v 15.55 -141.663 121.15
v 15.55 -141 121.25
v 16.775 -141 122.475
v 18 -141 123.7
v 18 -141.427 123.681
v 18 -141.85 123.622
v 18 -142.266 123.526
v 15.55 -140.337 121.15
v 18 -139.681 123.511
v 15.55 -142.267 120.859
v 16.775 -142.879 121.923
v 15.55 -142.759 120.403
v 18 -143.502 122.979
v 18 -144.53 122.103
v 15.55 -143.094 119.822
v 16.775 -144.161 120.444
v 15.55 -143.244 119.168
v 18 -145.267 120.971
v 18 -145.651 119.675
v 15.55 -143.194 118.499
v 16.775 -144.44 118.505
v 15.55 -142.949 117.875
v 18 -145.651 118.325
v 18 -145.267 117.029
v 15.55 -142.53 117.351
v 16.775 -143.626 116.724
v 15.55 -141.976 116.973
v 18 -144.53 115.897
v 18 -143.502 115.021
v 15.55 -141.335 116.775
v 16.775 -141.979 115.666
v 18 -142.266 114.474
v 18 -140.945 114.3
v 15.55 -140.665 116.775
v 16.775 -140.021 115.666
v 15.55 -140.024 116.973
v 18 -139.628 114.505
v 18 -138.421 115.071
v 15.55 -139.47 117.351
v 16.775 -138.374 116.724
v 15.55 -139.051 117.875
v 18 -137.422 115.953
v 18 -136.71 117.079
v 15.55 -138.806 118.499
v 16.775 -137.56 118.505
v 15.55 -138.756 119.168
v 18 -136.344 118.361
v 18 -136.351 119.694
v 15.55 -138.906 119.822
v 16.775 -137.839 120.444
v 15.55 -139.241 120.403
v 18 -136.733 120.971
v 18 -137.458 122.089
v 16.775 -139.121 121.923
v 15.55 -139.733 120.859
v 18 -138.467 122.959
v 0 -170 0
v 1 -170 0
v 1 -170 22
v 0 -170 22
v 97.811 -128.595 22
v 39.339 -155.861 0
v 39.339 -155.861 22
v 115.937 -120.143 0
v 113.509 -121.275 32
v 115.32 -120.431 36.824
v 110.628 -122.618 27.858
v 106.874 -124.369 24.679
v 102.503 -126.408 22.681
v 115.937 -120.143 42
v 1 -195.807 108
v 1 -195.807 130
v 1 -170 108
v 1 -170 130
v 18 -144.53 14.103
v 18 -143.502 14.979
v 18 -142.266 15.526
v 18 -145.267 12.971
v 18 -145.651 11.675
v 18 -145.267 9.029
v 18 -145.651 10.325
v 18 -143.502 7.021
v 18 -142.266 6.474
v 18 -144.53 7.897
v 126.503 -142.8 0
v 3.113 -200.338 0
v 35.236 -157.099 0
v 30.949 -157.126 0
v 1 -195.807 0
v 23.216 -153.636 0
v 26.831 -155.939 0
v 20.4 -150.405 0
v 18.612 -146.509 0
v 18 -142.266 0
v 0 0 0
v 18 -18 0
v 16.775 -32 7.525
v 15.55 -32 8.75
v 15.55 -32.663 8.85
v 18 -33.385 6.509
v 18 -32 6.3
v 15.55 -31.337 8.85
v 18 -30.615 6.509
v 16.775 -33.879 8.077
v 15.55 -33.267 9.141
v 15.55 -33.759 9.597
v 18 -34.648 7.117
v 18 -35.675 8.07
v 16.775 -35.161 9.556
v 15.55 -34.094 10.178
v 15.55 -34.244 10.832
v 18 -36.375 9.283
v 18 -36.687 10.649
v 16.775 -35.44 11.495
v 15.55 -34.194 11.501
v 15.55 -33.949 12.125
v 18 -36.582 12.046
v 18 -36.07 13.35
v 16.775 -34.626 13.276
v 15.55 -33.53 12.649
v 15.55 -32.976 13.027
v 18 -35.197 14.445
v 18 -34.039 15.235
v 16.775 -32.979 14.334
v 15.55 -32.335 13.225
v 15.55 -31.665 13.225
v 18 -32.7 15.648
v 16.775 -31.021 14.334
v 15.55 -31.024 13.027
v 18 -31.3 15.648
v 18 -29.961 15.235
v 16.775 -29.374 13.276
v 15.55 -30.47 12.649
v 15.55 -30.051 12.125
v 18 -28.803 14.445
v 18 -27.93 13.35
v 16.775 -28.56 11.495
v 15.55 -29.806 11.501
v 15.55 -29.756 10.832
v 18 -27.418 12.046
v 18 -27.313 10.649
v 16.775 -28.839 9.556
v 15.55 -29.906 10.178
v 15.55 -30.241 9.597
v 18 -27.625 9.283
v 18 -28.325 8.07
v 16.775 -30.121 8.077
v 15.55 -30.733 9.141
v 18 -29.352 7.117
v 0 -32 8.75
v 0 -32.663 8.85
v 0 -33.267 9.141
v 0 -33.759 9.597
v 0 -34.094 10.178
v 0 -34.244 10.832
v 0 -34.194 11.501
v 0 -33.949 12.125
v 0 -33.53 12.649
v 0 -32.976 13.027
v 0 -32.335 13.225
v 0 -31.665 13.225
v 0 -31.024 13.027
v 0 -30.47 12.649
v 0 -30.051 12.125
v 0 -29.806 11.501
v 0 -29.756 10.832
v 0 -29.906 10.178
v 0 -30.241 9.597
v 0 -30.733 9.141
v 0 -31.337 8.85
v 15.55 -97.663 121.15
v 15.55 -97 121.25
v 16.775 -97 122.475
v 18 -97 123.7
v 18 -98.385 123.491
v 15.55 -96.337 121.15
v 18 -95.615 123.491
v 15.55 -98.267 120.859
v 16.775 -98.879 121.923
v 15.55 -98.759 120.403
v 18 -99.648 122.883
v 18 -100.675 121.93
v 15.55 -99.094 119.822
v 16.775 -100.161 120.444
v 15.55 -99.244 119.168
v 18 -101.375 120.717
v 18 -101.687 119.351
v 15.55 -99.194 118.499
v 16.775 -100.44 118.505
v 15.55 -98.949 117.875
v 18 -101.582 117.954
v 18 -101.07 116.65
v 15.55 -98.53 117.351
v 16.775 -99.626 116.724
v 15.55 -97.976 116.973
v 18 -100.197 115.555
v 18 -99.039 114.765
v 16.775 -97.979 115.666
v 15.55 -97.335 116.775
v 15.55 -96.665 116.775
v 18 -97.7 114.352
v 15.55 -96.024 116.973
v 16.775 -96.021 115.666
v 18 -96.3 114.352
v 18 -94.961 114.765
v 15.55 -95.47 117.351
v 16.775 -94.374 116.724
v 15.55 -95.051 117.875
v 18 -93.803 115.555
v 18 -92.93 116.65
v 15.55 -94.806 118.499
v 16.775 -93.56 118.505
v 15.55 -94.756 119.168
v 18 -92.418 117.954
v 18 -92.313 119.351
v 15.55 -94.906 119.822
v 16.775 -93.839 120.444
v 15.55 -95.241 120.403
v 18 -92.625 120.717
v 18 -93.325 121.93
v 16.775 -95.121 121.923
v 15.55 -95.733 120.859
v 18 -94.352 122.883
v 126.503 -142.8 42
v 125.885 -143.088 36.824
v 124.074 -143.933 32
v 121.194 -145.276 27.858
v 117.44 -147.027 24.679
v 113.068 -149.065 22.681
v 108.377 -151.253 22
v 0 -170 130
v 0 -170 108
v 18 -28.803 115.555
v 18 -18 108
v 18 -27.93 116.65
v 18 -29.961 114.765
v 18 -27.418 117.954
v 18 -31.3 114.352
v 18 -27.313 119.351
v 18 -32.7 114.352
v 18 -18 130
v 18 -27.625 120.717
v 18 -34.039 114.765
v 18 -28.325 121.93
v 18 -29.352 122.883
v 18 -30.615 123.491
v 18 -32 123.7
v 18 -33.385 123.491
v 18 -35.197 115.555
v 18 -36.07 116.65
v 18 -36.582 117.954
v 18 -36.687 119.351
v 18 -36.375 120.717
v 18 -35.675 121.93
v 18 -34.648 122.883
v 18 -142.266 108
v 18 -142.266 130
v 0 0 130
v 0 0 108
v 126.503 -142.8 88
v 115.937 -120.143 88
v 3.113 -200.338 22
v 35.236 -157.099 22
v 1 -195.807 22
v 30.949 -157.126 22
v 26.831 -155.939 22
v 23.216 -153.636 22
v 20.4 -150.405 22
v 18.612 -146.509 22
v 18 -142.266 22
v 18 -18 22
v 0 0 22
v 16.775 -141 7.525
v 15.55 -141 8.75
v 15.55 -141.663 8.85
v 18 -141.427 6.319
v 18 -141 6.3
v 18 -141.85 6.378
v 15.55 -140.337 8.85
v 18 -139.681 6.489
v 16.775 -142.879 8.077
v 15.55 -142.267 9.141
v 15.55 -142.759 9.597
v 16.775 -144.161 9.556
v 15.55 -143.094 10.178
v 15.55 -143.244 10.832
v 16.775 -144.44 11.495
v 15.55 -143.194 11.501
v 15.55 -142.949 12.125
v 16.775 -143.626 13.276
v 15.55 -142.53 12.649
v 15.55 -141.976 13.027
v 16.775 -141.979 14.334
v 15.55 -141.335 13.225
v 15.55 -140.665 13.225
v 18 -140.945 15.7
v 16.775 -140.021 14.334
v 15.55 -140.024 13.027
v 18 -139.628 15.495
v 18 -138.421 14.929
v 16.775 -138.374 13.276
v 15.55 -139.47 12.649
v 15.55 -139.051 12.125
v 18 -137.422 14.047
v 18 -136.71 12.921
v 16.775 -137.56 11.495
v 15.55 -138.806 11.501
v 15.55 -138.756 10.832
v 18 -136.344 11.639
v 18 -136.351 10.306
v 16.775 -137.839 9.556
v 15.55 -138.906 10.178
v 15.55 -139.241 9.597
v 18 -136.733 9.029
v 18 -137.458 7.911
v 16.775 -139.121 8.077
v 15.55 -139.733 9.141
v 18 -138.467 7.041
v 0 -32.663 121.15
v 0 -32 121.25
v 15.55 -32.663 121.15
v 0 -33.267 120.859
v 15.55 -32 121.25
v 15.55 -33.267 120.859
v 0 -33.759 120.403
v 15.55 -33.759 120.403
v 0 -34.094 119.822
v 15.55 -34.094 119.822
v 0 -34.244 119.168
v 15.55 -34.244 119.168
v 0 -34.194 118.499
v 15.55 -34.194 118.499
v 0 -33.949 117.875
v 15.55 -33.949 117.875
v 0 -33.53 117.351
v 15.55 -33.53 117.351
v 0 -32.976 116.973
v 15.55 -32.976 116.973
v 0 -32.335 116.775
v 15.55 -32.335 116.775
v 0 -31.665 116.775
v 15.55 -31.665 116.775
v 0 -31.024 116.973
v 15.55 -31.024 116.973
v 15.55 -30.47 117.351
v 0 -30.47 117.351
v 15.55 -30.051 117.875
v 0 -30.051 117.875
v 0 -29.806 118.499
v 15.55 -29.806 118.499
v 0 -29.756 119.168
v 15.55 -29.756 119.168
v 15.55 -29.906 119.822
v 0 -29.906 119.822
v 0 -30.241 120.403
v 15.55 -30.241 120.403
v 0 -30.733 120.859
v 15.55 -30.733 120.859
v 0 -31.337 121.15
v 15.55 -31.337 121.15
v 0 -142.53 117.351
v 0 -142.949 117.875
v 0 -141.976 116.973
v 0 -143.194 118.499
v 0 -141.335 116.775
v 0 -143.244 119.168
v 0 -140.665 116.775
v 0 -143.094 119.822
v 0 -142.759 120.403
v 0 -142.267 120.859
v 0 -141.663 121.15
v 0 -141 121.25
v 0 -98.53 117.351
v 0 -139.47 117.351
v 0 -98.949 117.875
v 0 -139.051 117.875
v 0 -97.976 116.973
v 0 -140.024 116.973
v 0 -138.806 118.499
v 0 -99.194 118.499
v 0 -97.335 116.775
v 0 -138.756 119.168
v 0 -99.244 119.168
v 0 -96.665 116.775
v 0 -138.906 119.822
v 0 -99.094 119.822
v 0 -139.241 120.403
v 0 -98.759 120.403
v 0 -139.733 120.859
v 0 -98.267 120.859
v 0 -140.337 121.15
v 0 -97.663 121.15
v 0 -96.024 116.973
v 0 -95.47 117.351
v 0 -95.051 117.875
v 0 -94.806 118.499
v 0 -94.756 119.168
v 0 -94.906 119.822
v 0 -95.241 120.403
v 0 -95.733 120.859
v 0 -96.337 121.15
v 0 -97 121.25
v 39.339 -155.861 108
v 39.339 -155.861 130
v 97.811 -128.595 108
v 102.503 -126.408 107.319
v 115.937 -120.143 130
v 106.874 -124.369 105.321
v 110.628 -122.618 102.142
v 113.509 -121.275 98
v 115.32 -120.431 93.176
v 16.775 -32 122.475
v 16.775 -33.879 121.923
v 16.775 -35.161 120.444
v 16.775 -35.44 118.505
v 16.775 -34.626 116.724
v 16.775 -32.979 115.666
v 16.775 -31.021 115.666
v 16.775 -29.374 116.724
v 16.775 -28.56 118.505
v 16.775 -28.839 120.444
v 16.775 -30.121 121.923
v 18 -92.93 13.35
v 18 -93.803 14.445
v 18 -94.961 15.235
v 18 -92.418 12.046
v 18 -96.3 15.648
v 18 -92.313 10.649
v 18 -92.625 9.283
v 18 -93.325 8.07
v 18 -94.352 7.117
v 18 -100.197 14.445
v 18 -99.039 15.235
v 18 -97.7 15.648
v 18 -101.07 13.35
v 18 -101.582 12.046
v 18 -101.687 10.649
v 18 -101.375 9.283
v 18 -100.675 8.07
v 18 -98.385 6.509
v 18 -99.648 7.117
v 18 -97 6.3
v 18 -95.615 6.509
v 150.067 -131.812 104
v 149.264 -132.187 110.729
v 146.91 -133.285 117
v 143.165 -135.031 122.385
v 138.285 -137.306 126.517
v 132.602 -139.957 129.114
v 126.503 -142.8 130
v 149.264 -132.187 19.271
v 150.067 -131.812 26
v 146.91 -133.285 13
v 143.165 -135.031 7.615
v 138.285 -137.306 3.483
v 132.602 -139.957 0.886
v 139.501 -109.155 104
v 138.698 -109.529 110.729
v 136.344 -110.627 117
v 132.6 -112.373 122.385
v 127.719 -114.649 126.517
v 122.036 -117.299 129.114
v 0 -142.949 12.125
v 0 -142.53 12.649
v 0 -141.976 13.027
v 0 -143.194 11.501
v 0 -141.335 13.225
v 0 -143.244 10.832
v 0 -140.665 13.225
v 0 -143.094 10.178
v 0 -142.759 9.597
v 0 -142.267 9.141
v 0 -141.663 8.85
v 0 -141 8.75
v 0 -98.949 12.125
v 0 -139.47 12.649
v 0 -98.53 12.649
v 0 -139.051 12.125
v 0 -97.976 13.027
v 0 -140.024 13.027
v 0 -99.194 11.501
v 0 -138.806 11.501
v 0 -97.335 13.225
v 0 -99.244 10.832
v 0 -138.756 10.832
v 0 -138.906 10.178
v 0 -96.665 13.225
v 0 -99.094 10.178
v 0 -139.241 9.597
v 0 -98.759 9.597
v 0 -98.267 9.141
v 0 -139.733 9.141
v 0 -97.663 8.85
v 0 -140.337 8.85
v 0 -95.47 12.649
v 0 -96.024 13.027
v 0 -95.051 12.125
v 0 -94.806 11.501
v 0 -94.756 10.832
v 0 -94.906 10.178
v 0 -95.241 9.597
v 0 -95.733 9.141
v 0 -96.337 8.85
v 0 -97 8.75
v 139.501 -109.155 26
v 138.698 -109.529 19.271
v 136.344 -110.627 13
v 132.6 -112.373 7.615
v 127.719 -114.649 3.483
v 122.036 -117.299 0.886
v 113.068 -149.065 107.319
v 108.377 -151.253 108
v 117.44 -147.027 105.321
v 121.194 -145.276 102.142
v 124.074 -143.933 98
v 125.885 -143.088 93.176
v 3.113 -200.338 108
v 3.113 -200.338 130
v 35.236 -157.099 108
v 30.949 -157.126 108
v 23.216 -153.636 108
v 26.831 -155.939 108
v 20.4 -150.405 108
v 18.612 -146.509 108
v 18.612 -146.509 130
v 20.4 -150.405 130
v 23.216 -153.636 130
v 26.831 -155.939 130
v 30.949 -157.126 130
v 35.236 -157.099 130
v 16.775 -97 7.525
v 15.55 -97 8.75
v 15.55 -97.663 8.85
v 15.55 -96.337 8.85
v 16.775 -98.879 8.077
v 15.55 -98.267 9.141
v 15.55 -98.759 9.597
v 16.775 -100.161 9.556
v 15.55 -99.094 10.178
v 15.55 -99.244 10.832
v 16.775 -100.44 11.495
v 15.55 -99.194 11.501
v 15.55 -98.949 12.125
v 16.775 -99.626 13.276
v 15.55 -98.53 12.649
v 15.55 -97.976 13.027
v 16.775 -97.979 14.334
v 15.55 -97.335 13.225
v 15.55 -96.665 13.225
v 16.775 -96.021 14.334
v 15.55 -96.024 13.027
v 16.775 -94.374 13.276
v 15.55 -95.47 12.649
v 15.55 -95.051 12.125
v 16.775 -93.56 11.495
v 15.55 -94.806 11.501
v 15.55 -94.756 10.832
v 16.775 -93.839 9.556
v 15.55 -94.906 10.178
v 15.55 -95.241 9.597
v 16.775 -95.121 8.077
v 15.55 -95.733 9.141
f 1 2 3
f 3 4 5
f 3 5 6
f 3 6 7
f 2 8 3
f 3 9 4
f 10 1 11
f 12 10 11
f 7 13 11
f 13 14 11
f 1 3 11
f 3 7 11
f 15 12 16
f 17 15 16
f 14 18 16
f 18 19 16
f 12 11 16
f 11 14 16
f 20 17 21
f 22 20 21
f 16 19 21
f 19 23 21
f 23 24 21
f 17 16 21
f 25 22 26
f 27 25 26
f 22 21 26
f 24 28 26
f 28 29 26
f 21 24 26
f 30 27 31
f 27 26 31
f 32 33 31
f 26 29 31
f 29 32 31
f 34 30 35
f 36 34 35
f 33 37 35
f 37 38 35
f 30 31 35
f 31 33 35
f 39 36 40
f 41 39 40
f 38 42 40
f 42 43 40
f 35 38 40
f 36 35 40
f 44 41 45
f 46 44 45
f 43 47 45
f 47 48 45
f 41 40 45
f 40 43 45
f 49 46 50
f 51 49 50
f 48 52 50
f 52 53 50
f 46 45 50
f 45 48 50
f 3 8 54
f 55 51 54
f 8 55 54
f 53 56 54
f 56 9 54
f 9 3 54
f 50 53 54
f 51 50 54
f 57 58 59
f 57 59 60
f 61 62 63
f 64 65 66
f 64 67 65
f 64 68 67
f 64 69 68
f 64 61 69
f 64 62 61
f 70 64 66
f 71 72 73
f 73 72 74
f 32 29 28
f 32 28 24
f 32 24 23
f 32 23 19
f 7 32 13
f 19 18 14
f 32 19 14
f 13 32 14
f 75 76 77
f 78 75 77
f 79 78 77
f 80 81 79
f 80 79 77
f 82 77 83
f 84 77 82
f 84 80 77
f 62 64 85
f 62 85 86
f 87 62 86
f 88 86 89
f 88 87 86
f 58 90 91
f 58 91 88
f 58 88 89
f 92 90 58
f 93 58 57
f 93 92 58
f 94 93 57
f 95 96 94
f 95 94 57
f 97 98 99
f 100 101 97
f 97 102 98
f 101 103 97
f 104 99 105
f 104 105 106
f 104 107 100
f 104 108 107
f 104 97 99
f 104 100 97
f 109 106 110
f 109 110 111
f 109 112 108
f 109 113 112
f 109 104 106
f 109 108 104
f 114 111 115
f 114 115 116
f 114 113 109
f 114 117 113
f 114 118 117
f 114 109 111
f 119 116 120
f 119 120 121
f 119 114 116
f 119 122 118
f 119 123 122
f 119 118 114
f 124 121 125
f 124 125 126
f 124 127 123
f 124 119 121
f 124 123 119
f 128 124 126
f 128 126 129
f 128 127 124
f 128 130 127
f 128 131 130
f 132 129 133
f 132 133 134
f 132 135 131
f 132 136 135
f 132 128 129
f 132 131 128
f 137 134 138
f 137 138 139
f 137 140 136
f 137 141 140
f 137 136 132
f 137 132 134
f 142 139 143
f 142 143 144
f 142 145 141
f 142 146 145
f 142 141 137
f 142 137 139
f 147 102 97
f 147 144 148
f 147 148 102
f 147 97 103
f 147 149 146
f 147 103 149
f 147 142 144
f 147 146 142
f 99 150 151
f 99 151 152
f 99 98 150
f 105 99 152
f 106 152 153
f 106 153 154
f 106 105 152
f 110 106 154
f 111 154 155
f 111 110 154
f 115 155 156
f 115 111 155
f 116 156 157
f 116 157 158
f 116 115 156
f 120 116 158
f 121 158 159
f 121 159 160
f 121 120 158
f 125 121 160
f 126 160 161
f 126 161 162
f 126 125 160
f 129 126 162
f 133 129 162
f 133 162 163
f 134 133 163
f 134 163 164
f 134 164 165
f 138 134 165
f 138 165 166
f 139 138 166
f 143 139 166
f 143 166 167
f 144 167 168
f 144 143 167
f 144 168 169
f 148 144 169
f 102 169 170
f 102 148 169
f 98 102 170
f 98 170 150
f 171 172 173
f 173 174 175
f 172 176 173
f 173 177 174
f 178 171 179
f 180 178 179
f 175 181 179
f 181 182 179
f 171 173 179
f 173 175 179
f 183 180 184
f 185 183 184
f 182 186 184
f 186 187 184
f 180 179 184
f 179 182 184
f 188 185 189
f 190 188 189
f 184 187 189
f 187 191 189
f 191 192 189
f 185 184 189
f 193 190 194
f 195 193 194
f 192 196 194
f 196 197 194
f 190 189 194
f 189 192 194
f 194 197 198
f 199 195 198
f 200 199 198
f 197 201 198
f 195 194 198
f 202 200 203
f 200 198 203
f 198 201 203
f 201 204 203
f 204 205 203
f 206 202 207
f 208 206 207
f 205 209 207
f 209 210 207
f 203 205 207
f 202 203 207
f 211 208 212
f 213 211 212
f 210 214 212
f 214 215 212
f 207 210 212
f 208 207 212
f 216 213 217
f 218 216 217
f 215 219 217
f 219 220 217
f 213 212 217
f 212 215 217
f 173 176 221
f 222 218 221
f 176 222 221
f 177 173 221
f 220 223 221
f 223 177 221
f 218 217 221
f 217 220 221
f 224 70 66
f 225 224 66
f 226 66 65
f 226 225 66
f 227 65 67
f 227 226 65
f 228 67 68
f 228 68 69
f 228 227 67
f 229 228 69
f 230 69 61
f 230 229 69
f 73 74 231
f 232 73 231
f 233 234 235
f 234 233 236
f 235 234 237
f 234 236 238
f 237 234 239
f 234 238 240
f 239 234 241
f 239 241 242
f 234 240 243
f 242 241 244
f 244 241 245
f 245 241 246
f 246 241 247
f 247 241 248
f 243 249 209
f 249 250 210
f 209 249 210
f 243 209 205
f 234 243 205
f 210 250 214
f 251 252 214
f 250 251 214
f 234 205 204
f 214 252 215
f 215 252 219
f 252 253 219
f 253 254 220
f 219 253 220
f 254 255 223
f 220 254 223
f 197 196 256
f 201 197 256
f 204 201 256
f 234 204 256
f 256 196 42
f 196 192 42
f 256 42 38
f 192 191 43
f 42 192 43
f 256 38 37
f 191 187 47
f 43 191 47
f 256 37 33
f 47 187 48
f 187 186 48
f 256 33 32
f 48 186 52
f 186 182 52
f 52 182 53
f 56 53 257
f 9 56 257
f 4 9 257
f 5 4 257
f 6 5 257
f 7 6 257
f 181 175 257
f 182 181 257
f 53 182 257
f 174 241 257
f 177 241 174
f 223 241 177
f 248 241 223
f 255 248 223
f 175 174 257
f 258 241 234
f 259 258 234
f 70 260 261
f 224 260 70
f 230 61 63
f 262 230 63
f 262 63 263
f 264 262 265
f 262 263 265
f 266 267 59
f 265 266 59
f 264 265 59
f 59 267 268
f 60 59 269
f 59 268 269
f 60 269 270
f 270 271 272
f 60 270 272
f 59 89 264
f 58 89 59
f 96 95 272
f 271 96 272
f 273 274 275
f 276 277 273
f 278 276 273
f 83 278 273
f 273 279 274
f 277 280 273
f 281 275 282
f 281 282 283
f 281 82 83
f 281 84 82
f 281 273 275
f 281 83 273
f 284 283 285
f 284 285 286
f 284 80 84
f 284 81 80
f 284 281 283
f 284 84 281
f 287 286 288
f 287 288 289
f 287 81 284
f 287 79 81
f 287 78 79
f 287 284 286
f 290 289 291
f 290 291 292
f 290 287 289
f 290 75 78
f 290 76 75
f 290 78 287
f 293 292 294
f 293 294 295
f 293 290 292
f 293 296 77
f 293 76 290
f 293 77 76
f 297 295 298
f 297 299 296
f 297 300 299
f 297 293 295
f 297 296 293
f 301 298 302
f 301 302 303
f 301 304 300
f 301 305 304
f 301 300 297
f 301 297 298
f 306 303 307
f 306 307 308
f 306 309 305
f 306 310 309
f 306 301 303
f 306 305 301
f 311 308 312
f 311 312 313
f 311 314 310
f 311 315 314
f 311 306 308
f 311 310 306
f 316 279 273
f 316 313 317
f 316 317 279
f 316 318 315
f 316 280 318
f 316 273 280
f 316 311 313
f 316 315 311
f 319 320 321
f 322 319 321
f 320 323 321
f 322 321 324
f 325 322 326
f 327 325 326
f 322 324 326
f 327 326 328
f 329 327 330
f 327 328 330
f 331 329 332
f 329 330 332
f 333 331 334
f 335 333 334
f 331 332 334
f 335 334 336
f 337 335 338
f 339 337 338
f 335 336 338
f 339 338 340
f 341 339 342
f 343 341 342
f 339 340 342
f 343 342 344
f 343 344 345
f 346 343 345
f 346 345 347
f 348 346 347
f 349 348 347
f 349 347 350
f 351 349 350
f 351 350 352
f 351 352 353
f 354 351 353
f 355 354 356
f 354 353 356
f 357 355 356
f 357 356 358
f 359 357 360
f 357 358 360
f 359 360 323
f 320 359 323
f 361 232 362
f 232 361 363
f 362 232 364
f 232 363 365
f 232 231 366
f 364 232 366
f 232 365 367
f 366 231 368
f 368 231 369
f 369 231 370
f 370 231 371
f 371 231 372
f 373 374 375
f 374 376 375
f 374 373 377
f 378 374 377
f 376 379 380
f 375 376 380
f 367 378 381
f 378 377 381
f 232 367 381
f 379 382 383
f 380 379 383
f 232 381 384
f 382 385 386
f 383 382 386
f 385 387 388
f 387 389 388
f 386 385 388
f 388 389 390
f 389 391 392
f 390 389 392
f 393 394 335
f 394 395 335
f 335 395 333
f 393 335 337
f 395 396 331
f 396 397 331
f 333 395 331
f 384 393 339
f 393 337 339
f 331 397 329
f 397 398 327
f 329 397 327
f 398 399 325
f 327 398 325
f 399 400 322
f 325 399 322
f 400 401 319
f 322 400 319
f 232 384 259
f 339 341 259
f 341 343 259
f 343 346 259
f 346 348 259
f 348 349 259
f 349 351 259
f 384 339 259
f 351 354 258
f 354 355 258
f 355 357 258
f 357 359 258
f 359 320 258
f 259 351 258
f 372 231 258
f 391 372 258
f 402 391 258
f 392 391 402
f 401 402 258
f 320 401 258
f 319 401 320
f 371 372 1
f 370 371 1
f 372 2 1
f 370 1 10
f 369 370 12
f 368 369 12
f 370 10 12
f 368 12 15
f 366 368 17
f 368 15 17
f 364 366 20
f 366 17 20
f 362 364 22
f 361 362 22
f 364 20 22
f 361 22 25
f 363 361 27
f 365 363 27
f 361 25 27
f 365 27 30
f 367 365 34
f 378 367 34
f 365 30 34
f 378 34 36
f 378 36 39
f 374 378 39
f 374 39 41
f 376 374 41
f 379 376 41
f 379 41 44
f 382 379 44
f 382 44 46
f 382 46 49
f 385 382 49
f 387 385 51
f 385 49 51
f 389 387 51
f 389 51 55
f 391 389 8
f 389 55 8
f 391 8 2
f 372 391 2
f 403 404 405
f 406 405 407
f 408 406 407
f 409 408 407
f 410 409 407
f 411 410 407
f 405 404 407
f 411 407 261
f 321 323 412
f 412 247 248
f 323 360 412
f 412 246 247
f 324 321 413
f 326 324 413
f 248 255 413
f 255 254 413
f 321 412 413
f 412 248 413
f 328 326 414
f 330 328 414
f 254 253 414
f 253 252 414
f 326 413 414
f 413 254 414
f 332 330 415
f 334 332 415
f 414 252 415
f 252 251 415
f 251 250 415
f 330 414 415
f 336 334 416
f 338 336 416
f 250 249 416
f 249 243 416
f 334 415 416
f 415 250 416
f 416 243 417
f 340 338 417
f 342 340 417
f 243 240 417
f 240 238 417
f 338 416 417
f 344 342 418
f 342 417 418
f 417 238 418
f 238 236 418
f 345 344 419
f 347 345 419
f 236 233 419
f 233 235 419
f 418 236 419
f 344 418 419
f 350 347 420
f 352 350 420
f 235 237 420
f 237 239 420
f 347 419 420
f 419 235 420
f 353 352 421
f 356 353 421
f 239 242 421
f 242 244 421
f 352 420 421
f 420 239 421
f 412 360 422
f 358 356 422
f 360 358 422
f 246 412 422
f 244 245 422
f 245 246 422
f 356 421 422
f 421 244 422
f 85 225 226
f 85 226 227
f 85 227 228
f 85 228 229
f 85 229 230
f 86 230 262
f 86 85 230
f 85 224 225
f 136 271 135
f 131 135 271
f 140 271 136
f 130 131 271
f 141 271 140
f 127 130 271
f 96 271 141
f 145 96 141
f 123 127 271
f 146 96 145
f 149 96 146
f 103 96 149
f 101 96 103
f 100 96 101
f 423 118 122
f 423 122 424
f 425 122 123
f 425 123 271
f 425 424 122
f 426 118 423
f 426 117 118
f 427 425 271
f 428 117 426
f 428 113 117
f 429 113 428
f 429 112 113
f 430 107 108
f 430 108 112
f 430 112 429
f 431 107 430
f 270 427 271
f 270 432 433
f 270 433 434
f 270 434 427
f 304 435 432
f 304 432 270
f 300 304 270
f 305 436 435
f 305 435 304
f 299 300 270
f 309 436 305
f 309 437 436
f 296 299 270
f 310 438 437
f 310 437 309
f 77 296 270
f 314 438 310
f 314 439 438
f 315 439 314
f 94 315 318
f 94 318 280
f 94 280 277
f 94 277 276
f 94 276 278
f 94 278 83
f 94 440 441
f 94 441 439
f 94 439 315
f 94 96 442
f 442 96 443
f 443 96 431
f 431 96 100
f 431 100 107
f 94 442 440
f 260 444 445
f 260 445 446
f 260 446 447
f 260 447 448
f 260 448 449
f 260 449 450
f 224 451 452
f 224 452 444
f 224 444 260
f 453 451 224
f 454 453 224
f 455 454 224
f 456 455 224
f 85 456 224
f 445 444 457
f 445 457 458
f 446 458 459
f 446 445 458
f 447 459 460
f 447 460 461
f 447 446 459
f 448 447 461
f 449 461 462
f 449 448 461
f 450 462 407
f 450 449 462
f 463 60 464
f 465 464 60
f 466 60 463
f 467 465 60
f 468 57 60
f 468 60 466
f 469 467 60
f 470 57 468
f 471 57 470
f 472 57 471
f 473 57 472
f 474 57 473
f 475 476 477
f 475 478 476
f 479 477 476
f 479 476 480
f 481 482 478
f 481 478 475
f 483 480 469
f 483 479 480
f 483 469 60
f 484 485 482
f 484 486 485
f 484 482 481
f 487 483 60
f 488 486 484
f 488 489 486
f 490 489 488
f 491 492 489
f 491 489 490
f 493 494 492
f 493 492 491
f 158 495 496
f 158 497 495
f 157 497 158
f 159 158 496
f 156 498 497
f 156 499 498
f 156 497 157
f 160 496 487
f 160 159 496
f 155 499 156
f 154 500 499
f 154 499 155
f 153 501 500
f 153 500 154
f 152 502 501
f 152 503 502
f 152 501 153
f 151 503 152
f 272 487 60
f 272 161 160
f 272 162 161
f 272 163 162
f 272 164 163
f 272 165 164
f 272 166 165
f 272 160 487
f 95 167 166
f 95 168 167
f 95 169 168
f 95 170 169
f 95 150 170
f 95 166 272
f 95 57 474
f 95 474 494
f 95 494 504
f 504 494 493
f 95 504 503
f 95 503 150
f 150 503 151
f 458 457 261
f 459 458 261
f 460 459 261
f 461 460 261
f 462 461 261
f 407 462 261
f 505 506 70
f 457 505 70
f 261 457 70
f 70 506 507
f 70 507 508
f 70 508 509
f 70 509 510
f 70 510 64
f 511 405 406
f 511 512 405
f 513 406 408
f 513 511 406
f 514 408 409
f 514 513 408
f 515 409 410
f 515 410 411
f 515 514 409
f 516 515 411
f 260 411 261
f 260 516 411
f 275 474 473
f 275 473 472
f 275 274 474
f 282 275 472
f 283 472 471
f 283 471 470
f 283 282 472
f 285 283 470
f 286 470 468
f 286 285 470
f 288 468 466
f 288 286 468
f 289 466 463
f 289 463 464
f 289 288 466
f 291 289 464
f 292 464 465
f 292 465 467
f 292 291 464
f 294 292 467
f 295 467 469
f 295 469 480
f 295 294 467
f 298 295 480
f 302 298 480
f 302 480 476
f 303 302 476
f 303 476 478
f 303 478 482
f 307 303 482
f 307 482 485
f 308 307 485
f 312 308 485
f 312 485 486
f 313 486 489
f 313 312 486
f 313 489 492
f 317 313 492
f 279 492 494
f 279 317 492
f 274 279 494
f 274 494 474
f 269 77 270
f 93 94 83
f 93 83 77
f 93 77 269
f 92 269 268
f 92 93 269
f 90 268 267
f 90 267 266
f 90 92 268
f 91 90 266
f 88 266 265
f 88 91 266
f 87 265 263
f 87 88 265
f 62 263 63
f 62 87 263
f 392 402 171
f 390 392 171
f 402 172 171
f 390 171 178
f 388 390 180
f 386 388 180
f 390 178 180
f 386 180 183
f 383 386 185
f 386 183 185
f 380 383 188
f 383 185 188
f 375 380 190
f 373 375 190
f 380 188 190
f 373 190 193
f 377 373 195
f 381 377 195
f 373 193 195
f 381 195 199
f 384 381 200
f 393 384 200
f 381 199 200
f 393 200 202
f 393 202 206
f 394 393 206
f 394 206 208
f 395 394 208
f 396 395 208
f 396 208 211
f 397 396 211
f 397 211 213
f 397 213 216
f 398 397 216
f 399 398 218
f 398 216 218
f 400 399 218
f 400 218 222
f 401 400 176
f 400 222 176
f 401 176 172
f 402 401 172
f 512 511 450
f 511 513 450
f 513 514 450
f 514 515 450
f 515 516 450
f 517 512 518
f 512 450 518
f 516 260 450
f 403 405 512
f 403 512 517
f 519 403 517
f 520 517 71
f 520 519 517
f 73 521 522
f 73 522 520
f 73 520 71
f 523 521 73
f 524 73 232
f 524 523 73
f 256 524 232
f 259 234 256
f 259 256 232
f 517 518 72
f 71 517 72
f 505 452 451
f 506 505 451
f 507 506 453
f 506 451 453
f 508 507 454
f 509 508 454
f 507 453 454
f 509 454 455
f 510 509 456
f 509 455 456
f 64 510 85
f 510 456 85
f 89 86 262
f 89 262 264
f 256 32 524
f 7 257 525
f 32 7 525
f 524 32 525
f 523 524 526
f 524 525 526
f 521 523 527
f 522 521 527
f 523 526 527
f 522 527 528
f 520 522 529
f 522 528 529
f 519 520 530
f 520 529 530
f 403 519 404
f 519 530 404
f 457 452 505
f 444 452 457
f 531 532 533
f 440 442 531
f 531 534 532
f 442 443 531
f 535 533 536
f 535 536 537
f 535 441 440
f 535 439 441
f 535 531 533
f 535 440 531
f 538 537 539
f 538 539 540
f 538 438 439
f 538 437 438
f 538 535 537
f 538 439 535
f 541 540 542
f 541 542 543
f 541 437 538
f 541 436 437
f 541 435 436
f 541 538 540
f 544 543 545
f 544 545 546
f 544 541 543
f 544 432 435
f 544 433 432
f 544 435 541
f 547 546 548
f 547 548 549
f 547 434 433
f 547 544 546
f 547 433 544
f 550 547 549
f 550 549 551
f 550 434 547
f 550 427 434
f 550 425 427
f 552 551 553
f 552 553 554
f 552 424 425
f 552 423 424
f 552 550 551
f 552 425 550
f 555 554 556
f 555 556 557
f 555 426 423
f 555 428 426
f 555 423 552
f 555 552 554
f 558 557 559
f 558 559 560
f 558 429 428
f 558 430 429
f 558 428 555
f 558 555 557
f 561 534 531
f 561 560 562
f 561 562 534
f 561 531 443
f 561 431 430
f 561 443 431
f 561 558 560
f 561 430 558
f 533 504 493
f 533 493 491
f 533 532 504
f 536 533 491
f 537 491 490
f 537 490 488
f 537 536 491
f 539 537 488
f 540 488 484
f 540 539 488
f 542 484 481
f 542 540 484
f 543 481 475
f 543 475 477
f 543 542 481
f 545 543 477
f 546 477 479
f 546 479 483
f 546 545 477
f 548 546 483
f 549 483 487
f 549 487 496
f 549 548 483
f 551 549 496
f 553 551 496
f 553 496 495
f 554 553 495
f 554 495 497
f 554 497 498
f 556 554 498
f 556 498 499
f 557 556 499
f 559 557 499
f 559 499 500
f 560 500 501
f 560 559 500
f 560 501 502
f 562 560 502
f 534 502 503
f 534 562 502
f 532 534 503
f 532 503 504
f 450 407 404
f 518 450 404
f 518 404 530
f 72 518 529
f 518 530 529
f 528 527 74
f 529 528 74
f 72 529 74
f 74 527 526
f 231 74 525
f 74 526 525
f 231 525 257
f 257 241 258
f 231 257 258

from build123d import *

# Parameters (mm, degrees)
AUFSATZ_LINEAR_AUSTRAGEN1_DEPTH              = 22
AUFSATZ_LINEAR_AUSTRAGEN2_DEPTH              = 25
FORMSENKUNG_F_R_M4_LINSENSENKSCHRAUB_2_COUNT = 2
FORMSENKUNG_F_R_M4_LINSENSENKSCHRAUB_2_PITCH = 109
FORMSENKUNG_F_R_M4_LINSENSENKSCHRAUB_3_COUNT = 2
FORMSENKUNG_F_R_M4_LINSENSENKSCHRAUB_3_PITCH = 65
VERRUNDUNG1_R                                = 20
FASE1_SIZE                                   = 18


with BuildPart() as part:
    # Skizze1 → Aufsatz-Linear austragen1 (new body)
    with BuildSketch(Plane.XY):
        with BuildLine():
            Line((0, 0), (18, 0))
            Line((18, 0), (18, -142.266450527))
            ThreePointArc((18, -142.266450527), (24.940505875, -154.917322215), (39.339273926, -155.861067333))
            Line((39.339273926, -155.861067333), (115.937364916, -120.142790905))
            Line((115.937364916, -120.142790905), (126.502821459, -142.80048558))
            Line((126.502821459, -142.80048558), (3.113091309, -200.338061687))
            Line((3.113091309, -200.338061687), (1, -195.806522752))
            Line((1, -195.806522752), (1, -175))
            Line((1, -175), (1, -170))
            Line((1, -170), (0, -170))
            Line((0, -170), (0, 0))
        make_face()
    aufsatz_linear_austragen1 = extrude(amount=AUFSATZ_LINEAR_AUSTRAGEN1_DEPTH)

    # Skizze2 → Aufsatz-Linear austragen2 (add)
    with BuildSketch(Plane(origin=(77.289946844, -165.748825893, 0), x_dir=(0.9063077870366477, 0.4226182617407045, 0), z_dir=(0.4226182617407045, -0.9063077870366477, 0))):
        with BuildLine():
            Line((54.300399179, 22), (54.300399179, 65))
            Line((54.300399179, 65), (80.300399179, 65))
            Line((80.300399179, 65), (80.300399179, 26))
            ThreePointArc((80.300399179, 26), (72.68517549, 7.615223689), (54.300399179, 0))
            Line((54.300399179, 0), (54.300399179, 22))
        make_face()
    aufsatz_linear_austragen2 = extrude(amount=-AUFSATZ_LINEAR_AUSTRAGEN2_DEPTH)

    # Skizze6 → Formsenkung für M4 Linsensenkschraube mit Schlitz1 (revolve, cut)
    with BuildSketch(Plane(origin=(18, -32, 11), x_dir=(0, 0, -1), z_dir=(0, 1, 0))):
        Polygon((0, 0), (0, 18), (2.25, 18), (2.25, 2.45), (4.7, 0), align=None)
    formsenkung_f_r_m4_linsensenkschraube_mi = revolve(axis=Axis((24.35, -32, 11), (-1, 0, 0)), mode=Mode.SUBTRACT)

    # Formsenkung f_r M4 Linsensenkschraub 2: Formsenkung für M4 Linsensenkschraube mit Schlitz1 ×2
    with Locations(*[(0, -i * FORMSENKUNG_F_R_M4_LINSENSENKSCHRAUB_2_PITCH, 0) for i in range(1, FORMSENKUNG_F_R_M4_LINSENSENKSCHRAUB_2_COUNT)]):
        add(formsenkung_f_r_m4_linsensenkschraube_mi, mode=Mode.SUBTRACT)

    # Formsenkung f_r M4 Linsensenkschraub 3: Formsenkung für M4 Linsensenkschraube mit Schlitz1 ×2
    with Locations(*[(0, -i * FORMSENKUNG_F_R_M4_LINSENSENKSCHRAUB_3_PITCH, 0) for i in range(1, FORMSENKUNG_F_R_M4_LINSENSENKSCHRAUB_3_COUNT)]):
        add(formsenkung_f_r_m4_linsensenkschraube_mi, mode=Mode.SUBTRACT)

    # Spiegeln4: Aufsatz-Linear austragen2 across plane
    add(aufsatz_linear_austragen2.mirror(Plane(origin=(86.351068046, -56.694772515, 65), x_dir=(1, 0, 0), z_dir=(0, 0, -1))))

    # Spiegeln5: Aufsatz-Linear austragen1, Formsenkung für M4 Linsensenkschraube mit Schlitz1 across plane
    add(aufsatz_linear_austragen1.mirror(Plane.XY.offset(65)))
    add(formsenkung_f_r_m4_linsensenkschraube_mi.mirror(Plane.XY.offset(65)), mode=Mode.SUBTRACT)

    # Spiegeln5 copy 1 sketch → Spiegeln5 copy 1 (revolve, cut)
    with BuildSketch(Plane(origin=(18, -141, 119), x_dir=(0, 0, 1), z_dir=(0, 1, 0))):
        Polygon((0, 0), (0, -18), (2.25, -18), (2.25, -2.45), (4.7, 0), align=None)
    revolve(axis=Axis((24.35, -141, 119), (1, 0, 0)), mode=Mode.SUBTRACT)

    # Spiegeln5 copy 2 sketch → Spiegeln5 copy 2 (revolve, cut)
    with BuildSketch(Plane(origin=(18, -97, 119), x_dir=(0, 0, 1), z_dir=(0, 1, 0))):
        Polygon((0, 0), (0, -18), (2.25, -18), (2.25, -2.45), (4.7, 0), align=None)
    revolve(axis=Axis((24.35, -97, 119), (1, 0, 0)), mode=Mode.SUBTRACT)

    # Verrundung1
    verrundung1_edges = [part.edges().sort_by_distance(p)[0] for p in [
        (121.220093187, -131.471638242, 22),
        (121.220093187, -131.471638242, 108),
    ]]
    fillet(verrundung1_edges, radius=VERRUNDUNG1_R)

    # Fase1
    fase1_edges = [part.edges().sort_by_distance(p)[0] for p in [
        (18, 0, 119),
        (18, 0, 11),
    ]]
    chamfer(fase1_edges, length=FASE1_SIZE - 0.0001)  # a hair under: the kernel refuses the full size


solid = part.part
